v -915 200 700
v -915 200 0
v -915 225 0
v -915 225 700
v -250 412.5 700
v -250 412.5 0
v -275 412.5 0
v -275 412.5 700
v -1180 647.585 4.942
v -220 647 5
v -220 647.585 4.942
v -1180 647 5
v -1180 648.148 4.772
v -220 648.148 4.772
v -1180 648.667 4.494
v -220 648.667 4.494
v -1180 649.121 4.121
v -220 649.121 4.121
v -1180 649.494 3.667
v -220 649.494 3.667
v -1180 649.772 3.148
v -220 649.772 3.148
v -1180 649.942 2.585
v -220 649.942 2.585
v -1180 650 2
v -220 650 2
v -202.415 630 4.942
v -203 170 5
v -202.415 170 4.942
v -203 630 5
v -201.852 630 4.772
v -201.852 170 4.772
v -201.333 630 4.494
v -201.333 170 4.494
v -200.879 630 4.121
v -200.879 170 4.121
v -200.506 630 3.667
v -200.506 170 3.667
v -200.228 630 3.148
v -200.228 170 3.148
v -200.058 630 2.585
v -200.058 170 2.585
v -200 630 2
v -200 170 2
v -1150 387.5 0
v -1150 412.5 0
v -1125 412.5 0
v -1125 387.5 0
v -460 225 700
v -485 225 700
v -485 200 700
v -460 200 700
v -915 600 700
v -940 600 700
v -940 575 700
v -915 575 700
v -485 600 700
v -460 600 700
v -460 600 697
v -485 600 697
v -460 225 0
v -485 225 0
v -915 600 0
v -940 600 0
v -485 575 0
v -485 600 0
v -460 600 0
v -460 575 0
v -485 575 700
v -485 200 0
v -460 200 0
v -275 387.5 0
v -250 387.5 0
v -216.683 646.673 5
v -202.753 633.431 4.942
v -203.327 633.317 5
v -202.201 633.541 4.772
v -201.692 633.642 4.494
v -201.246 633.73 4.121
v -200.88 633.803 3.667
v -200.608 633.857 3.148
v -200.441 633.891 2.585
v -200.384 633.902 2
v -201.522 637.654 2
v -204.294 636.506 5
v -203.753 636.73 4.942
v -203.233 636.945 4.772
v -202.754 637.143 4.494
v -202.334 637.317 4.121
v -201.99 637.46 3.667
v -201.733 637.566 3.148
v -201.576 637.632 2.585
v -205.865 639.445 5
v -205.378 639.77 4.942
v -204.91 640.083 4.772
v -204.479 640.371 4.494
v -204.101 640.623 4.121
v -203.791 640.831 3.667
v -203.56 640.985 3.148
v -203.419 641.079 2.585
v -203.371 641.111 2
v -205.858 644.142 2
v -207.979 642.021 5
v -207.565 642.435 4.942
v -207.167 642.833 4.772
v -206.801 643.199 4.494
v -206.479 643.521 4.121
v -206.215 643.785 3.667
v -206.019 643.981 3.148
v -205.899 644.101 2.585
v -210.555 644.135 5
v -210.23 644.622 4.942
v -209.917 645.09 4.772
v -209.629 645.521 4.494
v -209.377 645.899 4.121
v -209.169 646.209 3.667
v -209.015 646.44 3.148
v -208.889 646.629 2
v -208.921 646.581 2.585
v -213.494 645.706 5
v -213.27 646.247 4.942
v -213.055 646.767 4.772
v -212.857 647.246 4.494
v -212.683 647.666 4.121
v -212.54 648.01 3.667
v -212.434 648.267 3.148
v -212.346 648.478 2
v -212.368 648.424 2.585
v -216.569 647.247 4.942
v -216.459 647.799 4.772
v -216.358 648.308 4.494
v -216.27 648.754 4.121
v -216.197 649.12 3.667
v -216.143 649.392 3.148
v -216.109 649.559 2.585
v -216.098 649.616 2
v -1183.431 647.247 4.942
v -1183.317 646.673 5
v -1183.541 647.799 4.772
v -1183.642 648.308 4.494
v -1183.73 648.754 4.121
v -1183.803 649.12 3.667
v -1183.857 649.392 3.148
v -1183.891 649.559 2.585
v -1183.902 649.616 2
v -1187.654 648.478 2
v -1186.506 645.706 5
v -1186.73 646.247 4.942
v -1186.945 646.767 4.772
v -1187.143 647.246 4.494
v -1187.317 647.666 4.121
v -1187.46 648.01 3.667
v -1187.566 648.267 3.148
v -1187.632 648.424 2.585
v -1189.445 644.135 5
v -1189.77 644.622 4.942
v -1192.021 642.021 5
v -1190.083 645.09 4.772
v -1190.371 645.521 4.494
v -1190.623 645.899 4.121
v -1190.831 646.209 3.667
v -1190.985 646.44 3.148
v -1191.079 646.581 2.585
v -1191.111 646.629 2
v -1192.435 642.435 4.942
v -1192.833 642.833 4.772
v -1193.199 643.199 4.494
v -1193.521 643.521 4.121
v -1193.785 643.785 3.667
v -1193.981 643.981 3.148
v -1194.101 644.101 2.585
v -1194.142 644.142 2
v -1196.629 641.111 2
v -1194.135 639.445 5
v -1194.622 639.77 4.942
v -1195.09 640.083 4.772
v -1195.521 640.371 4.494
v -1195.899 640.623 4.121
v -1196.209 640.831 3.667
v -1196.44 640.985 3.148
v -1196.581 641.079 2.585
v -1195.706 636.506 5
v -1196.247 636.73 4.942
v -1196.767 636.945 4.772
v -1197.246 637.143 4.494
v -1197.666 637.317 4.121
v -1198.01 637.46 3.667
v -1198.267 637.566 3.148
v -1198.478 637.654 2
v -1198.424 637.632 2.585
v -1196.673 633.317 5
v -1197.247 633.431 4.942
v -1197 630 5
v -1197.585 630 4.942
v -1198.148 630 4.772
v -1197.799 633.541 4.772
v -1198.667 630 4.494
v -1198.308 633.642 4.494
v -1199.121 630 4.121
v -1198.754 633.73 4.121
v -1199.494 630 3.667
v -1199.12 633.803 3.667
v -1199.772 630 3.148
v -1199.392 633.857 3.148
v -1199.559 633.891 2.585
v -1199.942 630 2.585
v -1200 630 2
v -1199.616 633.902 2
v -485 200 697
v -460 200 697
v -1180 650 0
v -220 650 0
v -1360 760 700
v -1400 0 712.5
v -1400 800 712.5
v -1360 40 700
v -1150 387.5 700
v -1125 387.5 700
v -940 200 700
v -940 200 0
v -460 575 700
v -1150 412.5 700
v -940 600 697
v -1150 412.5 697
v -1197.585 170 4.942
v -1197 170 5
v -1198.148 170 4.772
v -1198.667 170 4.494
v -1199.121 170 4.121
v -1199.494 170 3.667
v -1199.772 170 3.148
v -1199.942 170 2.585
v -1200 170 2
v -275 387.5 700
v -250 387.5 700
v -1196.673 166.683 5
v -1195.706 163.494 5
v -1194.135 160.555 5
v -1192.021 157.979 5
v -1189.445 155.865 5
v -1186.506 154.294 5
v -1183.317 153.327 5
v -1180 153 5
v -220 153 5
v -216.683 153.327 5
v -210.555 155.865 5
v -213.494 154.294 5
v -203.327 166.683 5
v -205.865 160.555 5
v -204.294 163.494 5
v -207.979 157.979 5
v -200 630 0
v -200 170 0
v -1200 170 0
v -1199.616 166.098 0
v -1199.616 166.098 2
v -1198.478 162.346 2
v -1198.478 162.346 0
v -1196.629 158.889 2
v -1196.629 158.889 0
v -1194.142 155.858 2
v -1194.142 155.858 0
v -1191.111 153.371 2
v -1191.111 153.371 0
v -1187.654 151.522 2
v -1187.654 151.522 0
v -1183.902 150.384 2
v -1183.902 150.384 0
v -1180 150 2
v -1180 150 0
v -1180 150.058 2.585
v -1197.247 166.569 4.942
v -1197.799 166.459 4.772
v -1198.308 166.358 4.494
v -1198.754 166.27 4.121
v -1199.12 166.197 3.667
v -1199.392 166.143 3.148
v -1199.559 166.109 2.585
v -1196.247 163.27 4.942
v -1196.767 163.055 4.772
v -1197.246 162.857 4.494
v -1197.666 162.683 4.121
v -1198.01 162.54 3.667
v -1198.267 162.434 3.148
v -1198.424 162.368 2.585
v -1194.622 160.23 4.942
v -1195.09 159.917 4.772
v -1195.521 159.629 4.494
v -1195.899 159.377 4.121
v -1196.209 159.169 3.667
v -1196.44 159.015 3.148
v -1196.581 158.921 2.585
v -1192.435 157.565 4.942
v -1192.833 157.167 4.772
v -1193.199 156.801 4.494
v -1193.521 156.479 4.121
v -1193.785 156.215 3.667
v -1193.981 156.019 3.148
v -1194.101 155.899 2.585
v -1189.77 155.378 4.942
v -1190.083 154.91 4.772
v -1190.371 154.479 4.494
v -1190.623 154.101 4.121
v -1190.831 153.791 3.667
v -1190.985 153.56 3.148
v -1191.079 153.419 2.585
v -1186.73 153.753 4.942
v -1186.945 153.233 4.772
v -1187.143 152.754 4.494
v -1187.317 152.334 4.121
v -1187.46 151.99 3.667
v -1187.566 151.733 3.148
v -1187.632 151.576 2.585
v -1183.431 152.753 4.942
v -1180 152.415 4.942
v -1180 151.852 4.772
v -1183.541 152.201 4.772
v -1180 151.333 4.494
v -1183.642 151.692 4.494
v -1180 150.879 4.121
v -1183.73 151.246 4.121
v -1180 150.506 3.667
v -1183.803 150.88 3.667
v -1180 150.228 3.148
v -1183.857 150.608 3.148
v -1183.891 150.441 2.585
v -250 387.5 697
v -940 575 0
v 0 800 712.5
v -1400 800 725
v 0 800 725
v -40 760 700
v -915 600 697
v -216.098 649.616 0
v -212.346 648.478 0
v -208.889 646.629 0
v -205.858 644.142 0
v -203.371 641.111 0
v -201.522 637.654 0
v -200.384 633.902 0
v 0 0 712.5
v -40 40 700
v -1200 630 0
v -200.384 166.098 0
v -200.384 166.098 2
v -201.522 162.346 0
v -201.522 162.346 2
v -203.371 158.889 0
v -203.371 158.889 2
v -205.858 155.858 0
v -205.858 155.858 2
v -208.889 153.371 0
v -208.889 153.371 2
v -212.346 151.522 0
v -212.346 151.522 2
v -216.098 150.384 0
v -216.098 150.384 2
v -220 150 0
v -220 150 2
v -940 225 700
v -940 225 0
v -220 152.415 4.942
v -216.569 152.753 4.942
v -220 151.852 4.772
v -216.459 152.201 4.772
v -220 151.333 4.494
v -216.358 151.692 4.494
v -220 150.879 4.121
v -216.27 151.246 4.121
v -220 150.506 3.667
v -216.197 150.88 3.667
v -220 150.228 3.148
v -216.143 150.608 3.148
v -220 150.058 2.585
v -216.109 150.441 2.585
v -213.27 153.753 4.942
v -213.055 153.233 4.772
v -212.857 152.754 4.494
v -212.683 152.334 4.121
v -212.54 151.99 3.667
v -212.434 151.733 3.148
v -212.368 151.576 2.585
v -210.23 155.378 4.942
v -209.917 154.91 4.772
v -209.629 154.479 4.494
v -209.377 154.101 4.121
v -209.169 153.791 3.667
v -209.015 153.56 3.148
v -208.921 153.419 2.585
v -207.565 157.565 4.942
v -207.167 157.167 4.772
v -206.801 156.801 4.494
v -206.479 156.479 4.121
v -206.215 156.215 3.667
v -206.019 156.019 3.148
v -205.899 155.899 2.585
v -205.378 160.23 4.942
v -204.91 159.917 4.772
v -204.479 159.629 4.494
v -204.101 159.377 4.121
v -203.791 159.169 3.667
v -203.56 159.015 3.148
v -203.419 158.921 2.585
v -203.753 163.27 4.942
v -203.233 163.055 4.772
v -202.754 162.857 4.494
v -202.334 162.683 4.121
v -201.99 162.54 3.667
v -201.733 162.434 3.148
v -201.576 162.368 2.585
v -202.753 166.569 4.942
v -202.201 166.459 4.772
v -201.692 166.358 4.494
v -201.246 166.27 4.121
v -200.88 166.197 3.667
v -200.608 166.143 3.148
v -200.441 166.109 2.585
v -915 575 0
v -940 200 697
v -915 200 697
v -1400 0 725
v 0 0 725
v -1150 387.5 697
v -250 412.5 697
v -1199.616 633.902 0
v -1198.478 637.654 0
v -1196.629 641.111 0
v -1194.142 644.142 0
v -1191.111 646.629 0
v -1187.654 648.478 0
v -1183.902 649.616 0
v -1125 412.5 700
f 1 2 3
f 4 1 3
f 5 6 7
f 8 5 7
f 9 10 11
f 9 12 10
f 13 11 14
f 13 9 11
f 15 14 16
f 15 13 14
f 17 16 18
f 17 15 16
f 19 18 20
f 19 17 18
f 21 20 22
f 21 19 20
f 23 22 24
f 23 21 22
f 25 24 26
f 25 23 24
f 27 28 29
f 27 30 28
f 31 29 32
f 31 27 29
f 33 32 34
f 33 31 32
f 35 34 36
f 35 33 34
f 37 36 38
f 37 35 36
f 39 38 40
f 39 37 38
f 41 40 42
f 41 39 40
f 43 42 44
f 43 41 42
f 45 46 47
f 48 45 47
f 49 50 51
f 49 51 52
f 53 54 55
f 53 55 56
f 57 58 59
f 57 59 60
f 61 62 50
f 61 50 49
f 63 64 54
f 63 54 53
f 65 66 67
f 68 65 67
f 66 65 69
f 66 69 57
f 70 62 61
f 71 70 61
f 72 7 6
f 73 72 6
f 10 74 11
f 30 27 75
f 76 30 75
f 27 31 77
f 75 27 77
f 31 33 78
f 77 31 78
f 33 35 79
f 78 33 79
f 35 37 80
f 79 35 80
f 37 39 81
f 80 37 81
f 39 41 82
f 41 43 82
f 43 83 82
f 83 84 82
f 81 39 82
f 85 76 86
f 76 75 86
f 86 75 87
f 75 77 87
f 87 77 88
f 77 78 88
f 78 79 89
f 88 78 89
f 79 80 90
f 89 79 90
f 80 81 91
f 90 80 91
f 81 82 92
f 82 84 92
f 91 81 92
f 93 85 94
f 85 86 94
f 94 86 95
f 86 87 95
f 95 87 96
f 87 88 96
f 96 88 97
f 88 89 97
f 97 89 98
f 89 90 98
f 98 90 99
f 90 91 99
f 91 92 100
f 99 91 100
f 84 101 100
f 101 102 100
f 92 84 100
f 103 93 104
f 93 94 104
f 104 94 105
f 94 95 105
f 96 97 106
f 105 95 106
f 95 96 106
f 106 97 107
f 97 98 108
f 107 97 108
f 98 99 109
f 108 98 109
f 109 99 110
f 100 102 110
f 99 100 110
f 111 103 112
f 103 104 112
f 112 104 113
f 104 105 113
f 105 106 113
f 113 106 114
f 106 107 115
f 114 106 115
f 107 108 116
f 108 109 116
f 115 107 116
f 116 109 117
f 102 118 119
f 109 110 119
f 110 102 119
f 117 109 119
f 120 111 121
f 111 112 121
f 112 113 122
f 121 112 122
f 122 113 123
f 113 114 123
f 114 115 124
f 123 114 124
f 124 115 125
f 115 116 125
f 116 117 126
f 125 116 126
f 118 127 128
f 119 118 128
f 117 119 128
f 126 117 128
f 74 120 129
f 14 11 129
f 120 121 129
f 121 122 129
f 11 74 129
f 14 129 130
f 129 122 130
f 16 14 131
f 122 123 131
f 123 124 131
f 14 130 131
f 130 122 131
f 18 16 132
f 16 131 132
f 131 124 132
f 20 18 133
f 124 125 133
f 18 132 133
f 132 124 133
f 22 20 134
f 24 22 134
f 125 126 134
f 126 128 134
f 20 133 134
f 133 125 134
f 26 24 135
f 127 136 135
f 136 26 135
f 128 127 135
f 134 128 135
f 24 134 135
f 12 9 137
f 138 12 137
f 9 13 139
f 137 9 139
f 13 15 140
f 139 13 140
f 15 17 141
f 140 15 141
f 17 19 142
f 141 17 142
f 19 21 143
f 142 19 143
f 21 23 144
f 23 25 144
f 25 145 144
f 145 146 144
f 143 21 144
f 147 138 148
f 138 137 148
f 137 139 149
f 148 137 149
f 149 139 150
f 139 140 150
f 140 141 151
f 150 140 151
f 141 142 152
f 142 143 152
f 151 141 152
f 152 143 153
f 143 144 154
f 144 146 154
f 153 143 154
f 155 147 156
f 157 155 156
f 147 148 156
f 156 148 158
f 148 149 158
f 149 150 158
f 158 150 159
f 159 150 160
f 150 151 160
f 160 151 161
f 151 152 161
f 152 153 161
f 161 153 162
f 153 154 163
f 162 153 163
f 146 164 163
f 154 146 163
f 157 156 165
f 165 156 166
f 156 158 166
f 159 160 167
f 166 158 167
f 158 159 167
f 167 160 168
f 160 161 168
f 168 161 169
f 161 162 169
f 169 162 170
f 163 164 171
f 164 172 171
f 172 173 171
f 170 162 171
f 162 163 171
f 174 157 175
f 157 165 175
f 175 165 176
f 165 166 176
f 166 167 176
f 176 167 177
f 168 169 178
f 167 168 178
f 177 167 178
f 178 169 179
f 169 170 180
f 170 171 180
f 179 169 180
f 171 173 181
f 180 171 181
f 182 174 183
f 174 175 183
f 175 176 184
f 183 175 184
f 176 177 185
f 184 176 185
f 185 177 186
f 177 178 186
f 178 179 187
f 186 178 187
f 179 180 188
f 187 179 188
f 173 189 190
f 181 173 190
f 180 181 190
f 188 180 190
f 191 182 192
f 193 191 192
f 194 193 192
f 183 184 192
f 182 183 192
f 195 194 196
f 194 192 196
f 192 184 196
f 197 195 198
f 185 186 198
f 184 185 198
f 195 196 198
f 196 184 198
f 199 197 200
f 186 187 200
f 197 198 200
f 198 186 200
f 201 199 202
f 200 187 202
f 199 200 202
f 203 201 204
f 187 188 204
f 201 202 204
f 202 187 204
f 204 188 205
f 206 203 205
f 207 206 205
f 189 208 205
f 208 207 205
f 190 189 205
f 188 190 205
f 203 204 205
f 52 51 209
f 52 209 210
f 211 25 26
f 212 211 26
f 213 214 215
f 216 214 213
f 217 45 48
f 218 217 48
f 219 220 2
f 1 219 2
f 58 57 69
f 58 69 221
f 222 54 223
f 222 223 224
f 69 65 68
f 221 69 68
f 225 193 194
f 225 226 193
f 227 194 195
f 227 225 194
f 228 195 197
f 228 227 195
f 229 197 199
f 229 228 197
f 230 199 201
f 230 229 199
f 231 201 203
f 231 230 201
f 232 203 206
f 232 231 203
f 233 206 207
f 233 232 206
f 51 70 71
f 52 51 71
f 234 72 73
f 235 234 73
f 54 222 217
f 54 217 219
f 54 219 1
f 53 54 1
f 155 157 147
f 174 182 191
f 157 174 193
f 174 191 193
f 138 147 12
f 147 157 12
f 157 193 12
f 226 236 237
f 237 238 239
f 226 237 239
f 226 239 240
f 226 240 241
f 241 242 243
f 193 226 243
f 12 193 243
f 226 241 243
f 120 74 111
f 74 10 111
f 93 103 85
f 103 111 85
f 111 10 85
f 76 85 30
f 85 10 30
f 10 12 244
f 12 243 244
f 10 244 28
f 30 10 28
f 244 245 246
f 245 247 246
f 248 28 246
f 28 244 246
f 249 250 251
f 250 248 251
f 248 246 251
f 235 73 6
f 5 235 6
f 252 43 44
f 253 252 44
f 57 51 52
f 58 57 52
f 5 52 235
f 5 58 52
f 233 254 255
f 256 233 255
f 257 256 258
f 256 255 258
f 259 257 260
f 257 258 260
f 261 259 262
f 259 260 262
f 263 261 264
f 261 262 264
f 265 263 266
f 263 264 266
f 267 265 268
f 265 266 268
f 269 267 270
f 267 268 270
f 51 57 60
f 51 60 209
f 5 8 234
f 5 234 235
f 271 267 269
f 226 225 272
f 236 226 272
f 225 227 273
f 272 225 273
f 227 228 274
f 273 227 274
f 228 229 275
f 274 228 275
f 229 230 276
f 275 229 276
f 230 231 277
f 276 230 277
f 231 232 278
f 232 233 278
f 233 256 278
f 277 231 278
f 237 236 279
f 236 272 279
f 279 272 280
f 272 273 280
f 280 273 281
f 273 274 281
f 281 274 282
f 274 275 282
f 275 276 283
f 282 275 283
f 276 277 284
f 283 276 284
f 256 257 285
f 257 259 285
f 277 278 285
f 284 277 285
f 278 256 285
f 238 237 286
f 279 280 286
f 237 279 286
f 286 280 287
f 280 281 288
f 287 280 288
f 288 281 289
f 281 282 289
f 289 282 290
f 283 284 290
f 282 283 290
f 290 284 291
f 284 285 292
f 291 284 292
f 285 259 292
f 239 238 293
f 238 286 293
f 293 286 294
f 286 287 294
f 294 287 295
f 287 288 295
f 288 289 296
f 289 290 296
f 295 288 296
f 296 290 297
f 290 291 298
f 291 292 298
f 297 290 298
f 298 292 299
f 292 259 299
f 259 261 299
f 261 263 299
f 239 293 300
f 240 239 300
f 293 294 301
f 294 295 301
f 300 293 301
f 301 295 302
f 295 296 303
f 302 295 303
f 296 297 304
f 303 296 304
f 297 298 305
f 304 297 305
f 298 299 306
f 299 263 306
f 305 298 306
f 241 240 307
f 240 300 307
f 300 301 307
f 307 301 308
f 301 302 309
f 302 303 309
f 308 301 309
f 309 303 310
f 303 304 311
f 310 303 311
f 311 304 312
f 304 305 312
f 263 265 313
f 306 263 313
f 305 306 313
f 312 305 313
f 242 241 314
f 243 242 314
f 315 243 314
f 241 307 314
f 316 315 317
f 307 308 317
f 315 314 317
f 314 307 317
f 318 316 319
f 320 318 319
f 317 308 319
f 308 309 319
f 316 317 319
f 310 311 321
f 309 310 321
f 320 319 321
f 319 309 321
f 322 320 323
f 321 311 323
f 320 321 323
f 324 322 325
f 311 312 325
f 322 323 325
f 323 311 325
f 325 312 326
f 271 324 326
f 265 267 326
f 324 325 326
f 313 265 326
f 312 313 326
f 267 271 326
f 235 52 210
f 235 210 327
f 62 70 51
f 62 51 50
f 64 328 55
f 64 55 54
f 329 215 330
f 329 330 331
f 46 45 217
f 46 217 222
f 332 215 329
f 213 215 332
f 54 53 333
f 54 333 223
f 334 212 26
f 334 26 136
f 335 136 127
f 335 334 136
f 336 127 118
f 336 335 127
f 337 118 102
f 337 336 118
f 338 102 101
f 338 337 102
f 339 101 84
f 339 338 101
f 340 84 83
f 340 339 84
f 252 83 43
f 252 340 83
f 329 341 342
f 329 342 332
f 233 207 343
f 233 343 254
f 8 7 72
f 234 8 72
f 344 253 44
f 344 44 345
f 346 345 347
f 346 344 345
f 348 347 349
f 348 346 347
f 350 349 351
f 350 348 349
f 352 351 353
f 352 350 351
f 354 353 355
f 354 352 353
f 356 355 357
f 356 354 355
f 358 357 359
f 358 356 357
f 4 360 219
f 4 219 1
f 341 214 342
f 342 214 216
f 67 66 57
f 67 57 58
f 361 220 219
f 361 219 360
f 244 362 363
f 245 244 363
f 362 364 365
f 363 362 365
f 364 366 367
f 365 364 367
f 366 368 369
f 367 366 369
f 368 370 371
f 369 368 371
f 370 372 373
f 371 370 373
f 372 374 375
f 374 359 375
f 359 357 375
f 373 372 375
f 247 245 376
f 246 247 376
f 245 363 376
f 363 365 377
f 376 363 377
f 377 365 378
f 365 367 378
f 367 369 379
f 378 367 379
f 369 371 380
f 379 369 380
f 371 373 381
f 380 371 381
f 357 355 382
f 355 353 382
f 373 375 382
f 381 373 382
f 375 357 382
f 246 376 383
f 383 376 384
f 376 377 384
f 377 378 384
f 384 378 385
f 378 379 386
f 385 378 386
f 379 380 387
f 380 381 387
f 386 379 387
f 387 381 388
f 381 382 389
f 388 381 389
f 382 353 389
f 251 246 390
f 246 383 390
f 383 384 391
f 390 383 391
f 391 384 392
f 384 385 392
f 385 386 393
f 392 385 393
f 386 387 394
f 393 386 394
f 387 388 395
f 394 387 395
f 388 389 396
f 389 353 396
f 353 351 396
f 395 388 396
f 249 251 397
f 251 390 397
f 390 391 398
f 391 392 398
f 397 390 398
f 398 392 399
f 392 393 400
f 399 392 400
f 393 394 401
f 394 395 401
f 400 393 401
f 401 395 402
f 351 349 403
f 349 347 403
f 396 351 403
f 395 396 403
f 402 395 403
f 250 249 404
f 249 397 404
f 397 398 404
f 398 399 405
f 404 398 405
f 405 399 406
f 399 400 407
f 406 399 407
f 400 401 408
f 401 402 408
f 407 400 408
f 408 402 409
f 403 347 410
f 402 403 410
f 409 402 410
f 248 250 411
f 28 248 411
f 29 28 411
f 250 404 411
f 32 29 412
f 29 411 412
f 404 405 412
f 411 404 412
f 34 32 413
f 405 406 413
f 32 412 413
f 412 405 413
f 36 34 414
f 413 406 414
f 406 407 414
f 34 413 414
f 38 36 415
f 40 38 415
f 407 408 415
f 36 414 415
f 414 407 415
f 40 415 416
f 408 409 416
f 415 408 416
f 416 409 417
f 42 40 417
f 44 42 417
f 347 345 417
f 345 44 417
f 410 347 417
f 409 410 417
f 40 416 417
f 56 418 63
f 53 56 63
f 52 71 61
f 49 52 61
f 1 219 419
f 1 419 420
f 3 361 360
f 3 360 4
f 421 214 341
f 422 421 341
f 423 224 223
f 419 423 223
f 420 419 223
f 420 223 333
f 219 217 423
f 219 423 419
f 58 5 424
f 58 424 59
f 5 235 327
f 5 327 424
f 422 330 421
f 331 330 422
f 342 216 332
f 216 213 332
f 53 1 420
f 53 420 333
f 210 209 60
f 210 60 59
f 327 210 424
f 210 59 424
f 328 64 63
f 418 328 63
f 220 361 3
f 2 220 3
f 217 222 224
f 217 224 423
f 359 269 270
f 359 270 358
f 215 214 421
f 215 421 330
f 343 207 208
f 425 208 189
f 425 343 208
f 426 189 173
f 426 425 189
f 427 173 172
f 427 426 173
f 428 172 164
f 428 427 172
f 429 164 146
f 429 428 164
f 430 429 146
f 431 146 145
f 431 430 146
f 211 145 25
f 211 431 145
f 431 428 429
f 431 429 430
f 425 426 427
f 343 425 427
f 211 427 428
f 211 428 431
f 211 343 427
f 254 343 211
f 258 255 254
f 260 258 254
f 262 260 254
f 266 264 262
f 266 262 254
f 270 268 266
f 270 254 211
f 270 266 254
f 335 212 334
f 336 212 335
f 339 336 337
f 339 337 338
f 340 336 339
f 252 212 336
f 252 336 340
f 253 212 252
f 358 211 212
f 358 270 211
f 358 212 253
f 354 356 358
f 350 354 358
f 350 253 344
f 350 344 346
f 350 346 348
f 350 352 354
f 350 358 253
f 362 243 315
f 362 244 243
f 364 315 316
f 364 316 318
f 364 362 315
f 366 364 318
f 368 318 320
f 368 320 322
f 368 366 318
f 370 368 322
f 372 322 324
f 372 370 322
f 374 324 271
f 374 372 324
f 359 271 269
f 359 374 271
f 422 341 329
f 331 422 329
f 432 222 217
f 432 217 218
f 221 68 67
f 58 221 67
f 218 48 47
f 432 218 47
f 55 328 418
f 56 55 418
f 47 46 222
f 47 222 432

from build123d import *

# Parameters (mm, degrees)
F0_W      = 25
F0_H      = 25
F1_DEPTH  = 700
F4_DEPTH  = 3
F6_W      = 1400
F6_H      = 800
F7_DEPTH  = 25
F8_SIZE2  = 12.5
F8_SIZE   = 40
F10_W     = 1000
F10_H     = 500
F11_DEPTH = 5
F12_R     = 20
F13_R     = 3


with BuildPart() as f1:
    # F0 (on Top) → F1 (new body)
    with BuildSketch(Plane.XY):
        with Locations((-472.5, 587.5)):
            Rectangle(F0_W, F0_H)
    extrude(amount=F1_DEPTH)


with BuildPart() as f1b:
    # F0 (on Top) → F1, piece 2 (new body)
    with BuildSketch(Plane.XY):
        Polygon((-250, 387.5), (-250, 400), (-250, 412.5), (-275, 412.5), (-275, 387.5), align=None)
    extrude(amount=F1_DEPTH)


with BuildPart() as f1c:
    # F0 (on Top) → F1, piece 3 (new body)
    with BuildSketch(Plane.XY):
        with Locations((-472.5, 212.5)):
            Rectangle(F0_W, F0_H)
    extrude(amount=F1_DEPTH)


with BuildPart() as f1d:
    # F0 (on Top) → F1, piece 4 (new body)
    with BuildSketch(Plane.XY):
        with Locations((-927.5, 587.5)):
            Rectangle(F0_W, F0_H)
    extrude(amount=F1_DEPTH)


with BuildPart() as f1e:
    # F0 (on Top) → F1, piece 5 (new body)
    with BuildSketch(Plane.XY):
        with Locations((-927.5, 212.5)):
            Rectangle(F0_W, F0_H)
    extrude(amount=F1_DEPTH)


with BuildPart() as f1f:
    # F0 (on Top) → F1, piece 6 (new body)
    with BuildSketch(Plane.XY):
        with Locations((-1137.5, 400)):
            Rectangle(F0_W, F0_H)
    extrude(amount=F1_DEPTH)


with BuildPart() as f4:
    # F3 (on offset) → F4 (new body)
    with BuildSketch(Plane.XY.offset(700)):
        Polygon((-250, 387.5), (-250, 400), (-250, 412.5), (-460, 600), (-485, 600), (-485, 400), (-485, 200), (-460, 200), align=None)
    extrude(amount=-F4_DEPTH)


with BuildPart() as f4b:
    # F3 (on offset) → F4, piece 2 (new body)
    with BuildSketch(Plane.XY.offset(700)):
        Polygon((-915, 600), (-940, 600), (-1150, 412.5), (-1150, 400), (-1150, 387.5), (-940, 200), (-915, 200), (-915, 400), align=None)
    extrude(amount=-F4_DEPTH)


with BuildPart() as f7:
    # F6 (on offset) → F7 (new body)
    with BuildSketch(Plane.XY.offset(700)):
        with Locations((-700, 400)):
            Rectangle(F6_W, F6_H)
    extrude(amount=F7_DEPTH)

    # F8
    f8_edges = [f7.edges().sort_by_distance(p)[0] for p in [
        (-700, 0, 700),
        (0, 400, 700),
        (-700, 800, 700),
        (-1400, 400, 700),
    ]]
    f8_side = f7.faces().sort_by_distance((-700, 400, 700))[0]
    chamfer(f8_edges, length=F8_SIZE, length2=F8_SIZE2, reference=f8_side)


with BuildPart() as f11:
    # F10 (on offset) → F11 (new body)
    with BuildSketch(Plane(origin=(0, 0, 5), x_dir=(1, 0, 0), z_dir=(0, 0, -1))):
        with Locations((-700, -400)):
            Rectangle(F10_W, F10_H)
    extrude(amount=F11_DEPTH)

    # F12
    f12_edges = [f11.edges().sort_by_distance(p)[0] for p in [
        (-1200, 150, 2.5),
        (-1200, 650, 2.5),
        (-200, 150, 2.5),
        (-200, 650, 2.5),
    ]]
    fillet(f12_edges, radius=F12_R)

    # F13
    f13_edges = [f11.edges().sort_by_distance(p)[0] for p in [
        (-700, 150, 5),
        (-200, 400, 5),
        (-205.857864, 644.142136, 5),
        (-700, 650, 5),
        (-1194.142136, 644.142136, 5),
        (-1200, 400, 5),
        (-1194.142136, 155.857864, 5),
    ]]
    fillet(f13_edges, radius=F13_R)


solid = Compound([f1.part, f1b.part, f1c.part, f1d.part, f1e.part, f1f.part, f4.part, f4b.part, f7.part, f11.part])
